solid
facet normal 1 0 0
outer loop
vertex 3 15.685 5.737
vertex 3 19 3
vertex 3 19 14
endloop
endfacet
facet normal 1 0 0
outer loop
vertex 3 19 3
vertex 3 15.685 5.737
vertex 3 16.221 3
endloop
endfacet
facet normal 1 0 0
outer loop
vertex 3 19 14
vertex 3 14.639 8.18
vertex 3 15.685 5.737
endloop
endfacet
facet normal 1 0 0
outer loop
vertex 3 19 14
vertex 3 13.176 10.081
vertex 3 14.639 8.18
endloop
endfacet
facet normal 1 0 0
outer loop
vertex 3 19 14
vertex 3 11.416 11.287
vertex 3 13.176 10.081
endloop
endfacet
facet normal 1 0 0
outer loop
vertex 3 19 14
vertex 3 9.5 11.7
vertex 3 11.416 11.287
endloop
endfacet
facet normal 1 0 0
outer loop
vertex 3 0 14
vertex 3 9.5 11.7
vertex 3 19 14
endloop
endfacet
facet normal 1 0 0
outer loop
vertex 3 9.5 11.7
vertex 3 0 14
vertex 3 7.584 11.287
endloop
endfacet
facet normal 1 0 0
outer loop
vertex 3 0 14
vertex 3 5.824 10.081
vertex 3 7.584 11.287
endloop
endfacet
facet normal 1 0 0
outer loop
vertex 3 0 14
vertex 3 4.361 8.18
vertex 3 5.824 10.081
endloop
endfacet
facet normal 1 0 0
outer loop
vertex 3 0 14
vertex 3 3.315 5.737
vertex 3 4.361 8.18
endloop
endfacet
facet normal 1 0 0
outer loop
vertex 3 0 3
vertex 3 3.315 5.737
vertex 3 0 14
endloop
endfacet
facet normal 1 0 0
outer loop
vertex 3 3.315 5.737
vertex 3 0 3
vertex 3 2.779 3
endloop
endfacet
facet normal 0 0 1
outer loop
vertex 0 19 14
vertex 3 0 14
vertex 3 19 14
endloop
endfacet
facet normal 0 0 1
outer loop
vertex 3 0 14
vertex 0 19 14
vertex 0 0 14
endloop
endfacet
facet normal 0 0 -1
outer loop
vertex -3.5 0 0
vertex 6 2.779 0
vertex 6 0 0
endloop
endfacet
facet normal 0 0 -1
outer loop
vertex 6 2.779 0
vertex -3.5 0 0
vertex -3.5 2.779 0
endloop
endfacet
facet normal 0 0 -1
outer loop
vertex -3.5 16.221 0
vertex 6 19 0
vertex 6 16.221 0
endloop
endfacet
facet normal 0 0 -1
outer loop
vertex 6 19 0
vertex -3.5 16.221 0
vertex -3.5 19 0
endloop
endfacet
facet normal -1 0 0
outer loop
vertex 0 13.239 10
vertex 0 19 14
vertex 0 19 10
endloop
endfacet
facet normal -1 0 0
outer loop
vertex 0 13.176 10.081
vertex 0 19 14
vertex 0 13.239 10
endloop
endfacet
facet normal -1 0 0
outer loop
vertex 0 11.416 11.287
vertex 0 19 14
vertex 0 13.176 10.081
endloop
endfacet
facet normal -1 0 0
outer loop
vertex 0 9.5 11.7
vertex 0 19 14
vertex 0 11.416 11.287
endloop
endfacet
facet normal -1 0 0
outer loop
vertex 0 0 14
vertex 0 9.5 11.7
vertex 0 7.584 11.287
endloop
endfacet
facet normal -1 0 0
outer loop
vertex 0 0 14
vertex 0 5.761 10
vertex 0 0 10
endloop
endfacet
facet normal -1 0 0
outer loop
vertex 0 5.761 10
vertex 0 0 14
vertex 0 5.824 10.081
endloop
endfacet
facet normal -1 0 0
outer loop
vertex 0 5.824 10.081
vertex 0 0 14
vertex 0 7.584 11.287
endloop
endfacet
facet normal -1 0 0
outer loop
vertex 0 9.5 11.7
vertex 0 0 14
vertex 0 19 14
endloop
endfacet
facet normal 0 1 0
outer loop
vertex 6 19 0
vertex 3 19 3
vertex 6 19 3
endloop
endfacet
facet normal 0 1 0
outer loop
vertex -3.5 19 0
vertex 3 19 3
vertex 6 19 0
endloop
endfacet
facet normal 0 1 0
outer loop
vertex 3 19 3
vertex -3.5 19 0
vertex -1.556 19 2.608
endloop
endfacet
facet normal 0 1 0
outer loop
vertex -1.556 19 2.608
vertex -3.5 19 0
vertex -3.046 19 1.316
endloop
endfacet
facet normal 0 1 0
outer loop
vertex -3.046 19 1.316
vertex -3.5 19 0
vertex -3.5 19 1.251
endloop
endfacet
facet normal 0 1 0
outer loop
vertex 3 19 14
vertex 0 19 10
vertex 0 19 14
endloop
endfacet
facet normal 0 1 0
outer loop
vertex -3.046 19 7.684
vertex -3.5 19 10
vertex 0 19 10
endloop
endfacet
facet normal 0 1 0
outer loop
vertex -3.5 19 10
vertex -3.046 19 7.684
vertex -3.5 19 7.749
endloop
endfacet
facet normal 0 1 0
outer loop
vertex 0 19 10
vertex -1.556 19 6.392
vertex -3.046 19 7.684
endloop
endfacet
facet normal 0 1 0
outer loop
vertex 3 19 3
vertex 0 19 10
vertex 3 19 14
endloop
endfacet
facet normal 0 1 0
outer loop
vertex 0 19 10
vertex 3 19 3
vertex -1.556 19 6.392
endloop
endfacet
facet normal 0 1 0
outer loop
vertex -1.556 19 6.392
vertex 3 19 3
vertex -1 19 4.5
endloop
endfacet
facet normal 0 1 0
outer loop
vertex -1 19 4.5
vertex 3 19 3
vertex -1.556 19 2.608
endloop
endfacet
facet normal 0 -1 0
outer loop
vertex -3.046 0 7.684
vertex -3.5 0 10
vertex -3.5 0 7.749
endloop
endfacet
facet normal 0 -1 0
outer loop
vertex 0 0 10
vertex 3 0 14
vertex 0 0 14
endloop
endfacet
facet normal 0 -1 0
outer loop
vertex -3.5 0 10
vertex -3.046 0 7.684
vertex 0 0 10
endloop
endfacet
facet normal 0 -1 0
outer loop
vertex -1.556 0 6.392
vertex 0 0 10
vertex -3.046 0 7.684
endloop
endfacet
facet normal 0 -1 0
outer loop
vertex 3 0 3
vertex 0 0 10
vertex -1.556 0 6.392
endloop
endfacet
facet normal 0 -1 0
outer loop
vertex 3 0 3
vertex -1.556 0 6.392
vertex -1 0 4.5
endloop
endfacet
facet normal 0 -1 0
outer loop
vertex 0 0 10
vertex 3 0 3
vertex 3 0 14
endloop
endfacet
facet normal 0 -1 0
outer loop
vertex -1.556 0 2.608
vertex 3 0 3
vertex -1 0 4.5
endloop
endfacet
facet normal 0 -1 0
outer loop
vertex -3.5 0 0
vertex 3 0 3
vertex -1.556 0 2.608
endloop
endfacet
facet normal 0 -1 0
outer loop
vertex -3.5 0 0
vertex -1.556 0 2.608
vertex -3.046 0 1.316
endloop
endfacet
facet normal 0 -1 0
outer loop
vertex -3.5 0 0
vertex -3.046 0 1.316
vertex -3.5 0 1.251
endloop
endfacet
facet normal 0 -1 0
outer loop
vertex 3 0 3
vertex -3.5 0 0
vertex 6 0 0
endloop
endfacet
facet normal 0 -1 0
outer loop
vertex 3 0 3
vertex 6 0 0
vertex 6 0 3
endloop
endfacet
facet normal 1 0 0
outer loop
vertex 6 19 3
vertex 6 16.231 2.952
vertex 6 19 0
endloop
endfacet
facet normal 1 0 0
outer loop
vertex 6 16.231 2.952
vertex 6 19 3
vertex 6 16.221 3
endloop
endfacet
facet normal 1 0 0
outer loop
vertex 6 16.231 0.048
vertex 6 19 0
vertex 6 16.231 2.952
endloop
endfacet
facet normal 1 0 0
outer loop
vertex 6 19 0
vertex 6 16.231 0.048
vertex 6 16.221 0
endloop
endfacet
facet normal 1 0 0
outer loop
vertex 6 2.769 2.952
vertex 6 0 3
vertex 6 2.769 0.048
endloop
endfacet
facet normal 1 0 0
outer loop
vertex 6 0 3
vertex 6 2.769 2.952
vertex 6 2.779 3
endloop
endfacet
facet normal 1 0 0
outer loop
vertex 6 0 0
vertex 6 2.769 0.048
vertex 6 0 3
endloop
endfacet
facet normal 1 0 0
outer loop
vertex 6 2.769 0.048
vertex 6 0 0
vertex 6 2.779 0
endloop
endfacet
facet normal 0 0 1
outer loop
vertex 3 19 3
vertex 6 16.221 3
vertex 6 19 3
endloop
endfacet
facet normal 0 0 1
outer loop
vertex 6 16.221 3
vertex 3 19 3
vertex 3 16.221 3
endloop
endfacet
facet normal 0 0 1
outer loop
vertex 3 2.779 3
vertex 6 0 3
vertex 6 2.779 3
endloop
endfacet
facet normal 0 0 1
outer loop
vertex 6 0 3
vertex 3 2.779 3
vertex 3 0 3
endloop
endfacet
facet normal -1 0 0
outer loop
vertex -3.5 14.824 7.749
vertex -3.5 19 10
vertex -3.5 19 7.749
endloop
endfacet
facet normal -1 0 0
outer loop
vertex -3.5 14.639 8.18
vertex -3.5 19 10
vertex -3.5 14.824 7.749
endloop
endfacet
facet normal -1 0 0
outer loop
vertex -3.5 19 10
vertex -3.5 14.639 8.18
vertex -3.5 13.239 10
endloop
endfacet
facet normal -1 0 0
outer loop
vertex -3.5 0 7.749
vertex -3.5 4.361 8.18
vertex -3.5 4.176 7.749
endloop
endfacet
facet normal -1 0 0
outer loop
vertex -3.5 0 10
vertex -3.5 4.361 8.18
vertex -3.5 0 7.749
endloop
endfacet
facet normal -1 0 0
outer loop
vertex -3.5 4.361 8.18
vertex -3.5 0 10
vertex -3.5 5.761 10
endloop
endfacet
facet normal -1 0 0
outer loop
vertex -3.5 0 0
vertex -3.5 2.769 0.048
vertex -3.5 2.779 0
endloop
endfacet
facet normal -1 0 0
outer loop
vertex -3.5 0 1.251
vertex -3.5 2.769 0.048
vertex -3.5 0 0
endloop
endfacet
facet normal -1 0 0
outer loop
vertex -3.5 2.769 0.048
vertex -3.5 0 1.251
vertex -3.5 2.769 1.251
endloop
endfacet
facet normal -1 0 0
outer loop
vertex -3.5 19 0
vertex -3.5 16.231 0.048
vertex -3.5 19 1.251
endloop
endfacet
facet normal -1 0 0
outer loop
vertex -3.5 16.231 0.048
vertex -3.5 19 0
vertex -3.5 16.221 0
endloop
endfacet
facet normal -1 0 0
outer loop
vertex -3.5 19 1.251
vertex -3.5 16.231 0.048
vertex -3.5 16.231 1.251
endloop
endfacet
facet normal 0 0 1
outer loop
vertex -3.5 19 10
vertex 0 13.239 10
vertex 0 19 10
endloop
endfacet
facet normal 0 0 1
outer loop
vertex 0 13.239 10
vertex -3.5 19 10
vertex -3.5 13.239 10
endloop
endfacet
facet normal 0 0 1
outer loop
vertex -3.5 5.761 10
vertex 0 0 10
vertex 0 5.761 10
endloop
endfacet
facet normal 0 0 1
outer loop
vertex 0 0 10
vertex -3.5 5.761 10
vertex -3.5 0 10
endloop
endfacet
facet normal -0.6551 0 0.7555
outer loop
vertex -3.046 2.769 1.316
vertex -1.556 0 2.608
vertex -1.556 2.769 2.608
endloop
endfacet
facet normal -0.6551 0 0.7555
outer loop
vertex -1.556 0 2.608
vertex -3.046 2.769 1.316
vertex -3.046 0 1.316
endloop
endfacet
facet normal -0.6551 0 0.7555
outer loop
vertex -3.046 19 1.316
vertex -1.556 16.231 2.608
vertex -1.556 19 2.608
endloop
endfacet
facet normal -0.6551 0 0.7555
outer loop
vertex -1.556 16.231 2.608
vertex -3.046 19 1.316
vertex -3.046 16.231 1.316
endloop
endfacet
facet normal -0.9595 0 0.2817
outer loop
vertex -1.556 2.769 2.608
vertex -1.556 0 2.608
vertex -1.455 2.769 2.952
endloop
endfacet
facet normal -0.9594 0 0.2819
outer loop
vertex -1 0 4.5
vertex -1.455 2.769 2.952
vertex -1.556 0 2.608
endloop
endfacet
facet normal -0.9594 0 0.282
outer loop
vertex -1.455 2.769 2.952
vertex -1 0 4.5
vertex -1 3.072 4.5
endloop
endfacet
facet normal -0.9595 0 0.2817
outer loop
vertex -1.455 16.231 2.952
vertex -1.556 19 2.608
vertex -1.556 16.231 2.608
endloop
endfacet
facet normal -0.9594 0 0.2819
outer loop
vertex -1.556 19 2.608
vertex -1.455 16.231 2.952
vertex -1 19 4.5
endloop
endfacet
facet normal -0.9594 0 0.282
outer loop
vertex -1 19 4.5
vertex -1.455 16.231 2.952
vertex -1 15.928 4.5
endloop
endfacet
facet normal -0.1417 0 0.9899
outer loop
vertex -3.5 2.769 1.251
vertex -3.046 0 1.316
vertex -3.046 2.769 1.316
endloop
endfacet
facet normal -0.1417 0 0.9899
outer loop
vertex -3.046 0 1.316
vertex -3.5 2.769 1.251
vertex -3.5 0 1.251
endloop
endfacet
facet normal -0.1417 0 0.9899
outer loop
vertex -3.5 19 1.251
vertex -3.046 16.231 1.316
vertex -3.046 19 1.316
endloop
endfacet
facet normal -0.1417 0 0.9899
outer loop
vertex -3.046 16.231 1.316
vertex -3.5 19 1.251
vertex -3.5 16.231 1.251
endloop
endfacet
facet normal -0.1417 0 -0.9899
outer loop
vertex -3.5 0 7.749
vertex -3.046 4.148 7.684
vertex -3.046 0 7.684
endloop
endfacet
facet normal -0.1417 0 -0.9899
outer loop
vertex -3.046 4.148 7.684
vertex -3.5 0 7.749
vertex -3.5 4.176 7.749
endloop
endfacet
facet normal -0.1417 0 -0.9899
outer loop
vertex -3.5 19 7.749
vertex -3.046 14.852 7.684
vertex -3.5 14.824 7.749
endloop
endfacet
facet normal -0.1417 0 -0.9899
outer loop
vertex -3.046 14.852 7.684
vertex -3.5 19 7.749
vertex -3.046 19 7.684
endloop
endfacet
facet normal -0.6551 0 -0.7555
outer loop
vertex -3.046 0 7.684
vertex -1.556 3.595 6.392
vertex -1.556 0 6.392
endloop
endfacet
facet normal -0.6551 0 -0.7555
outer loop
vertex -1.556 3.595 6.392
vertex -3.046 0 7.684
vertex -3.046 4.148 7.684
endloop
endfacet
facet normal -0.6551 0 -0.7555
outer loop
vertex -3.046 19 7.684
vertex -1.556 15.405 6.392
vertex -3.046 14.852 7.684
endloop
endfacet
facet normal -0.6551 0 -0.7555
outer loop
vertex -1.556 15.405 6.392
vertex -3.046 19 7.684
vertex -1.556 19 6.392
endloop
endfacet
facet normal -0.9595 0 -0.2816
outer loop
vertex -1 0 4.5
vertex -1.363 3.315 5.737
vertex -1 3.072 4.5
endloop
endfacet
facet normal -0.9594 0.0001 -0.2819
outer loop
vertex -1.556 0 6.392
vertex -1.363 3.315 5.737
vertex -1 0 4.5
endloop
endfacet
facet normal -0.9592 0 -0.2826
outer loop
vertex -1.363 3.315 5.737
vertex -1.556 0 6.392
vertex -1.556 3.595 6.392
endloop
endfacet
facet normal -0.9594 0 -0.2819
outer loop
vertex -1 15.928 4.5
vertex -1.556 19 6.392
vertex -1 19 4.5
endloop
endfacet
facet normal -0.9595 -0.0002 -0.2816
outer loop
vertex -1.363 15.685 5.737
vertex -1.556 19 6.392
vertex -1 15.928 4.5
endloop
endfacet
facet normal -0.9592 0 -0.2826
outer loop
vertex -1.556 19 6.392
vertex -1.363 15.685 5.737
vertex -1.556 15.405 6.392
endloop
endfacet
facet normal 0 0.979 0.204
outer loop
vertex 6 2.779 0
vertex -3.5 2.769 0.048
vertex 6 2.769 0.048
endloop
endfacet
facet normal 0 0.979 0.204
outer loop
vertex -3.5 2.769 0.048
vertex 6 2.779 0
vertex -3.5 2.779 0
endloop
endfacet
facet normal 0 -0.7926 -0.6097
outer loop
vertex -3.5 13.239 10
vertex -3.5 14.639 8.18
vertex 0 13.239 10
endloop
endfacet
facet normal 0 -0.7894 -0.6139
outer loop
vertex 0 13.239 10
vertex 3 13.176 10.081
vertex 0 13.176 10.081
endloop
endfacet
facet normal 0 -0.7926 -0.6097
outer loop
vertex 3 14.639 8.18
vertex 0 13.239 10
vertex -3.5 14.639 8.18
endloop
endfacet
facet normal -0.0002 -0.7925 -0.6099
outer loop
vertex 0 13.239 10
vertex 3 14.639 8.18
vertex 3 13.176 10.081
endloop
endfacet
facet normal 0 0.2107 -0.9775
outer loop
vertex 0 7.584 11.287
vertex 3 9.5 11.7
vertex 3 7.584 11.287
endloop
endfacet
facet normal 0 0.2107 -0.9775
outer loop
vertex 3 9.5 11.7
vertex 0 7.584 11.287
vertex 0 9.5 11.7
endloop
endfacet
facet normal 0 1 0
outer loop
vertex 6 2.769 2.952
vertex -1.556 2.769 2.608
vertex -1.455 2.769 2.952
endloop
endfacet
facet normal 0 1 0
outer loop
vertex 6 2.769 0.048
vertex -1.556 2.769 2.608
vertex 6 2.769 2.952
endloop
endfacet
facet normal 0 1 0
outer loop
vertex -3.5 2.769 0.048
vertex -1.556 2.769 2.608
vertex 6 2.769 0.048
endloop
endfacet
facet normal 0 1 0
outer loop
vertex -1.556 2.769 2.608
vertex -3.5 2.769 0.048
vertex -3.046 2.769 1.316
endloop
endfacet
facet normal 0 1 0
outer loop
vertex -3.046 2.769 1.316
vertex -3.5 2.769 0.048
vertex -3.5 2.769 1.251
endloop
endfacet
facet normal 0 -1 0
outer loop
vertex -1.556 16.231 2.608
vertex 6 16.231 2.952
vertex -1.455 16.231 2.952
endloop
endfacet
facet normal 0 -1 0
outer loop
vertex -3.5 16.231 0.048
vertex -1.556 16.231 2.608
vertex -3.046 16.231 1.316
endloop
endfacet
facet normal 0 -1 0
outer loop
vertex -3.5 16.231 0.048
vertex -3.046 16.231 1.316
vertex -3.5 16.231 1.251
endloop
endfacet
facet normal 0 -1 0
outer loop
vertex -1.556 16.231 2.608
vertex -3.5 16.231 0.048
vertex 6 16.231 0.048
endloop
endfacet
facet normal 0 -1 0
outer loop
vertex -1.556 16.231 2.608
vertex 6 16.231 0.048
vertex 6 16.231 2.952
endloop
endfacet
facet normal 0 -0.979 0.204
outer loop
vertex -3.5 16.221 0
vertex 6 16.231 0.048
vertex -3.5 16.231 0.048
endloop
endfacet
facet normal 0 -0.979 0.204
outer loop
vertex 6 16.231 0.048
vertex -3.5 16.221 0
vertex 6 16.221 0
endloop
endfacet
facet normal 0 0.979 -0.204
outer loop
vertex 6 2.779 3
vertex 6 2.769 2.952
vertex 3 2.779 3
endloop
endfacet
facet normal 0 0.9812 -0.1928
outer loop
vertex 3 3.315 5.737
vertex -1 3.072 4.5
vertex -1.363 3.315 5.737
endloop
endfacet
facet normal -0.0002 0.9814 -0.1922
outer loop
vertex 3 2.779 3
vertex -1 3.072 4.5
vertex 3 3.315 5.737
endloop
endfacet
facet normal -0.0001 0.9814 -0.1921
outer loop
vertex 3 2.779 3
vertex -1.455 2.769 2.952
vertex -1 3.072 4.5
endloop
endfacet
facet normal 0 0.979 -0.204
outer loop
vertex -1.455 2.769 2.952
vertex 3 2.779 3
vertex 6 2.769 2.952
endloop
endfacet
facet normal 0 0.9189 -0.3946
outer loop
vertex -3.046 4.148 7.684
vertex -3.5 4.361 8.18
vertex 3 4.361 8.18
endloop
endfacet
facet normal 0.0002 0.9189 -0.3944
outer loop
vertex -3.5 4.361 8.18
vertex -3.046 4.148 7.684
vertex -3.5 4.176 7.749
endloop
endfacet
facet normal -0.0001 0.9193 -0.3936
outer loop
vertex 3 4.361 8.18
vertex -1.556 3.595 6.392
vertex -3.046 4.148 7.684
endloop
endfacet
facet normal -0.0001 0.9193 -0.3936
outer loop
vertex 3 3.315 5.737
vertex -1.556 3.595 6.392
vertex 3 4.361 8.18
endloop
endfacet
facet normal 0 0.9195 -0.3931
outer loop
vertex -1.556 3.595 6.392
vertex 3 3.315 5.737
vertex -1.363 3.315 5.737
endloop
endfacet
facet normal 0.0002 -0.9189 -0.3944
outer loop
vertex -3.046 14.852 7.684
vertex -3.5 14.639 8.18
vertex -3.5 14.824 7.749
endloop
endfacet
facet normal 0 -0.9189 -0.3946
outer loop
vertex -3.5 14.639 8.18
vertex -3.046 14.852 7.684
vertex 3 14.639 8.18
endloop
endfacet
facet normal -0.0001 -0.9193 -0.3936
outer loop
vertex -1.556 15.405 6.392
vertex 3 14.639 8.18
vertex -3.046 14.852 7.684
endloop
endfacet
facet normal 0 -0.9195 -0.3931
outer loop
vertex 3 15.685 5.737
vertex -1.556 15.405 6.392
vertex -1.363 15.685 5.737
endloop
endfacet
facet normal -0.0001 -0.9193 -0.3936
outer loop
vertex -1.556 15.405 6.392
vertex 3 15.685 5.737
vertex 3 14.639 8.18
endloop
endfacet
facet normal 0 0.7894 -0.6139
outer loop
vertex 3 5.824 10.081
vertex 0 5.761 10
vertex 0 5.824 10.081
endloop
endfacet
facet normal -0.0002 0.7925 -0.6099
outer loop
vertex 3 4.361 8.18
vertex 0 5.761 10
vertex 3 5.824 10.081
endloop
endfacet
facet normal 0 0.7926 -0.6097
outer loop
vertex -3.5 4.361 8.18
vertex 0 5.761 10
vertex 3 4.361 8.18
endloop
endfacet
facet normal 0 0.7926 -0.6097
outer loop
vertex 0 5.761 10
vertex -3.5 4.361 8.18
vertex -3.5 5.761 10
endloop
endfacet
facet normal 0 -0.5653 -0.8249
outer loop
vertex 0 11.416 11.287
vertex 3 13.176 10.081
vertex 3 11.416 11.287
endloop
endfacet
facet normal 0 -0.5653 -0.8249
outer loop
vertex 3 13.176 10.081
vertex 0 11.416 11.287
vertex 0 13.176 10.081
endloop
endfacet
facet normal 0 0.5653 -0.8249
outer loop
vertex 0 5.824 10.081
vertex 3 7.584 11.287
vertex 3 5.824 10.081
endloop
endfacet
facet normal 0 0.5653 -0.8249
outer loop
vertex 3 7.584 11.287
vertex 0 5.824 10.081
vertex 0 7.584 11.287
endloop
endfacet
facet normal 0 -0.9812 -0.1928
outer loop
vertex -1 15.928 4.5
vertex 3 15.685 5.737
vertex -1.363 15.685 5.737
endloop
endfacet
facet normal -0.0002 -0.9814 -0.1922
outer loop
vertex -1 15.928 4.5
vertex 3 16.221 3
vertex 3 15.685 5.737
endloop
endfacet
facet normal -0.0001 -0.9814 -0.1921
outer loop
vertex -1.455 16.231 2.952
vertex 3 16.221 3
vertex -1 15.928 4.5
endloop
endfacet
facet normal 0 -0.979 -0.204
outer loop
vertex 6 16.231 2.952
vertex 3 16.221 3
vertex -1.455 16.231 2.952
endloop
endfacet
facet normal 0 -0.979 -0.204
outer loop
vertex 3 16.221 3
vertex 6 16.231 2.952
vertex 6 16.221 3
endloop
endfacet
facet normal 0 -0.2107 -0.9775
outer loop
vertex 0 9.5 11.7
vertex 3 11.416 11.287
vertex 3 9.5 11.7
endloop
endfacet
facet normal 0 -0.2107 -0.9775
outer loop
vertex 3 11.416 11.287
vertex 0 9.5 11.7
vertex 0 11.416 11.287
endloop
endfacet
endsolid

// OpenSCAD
w=19; //y
d=10; //z
extra_d = 4; 
h1=3; //x main
h2=3; // against glass
h3=3.5; // against wood (down)
gen=3;

r_sub = 3.5;

difference(){
    union(){
        cube([h1,w,d + extra_d]);
        translate([-h3,0,0]) cube([h1+h2+h3,w,gen]);
        translate([-h3,0,0]) cube([h1+ h3,w,d]);
    }
    union(){
        translate([-r_sub - 1,0,d - r_sub - 2]) rotate([-90,0,0]) cylinder(r=r_sub,h=w+1);
        scale([1,1,1.5]) translate([-h3-0.1,w/2,1]) rotate([0,90,0]) cylinder(r=6.8,h=h1+h2+h3+1);
    }
}
